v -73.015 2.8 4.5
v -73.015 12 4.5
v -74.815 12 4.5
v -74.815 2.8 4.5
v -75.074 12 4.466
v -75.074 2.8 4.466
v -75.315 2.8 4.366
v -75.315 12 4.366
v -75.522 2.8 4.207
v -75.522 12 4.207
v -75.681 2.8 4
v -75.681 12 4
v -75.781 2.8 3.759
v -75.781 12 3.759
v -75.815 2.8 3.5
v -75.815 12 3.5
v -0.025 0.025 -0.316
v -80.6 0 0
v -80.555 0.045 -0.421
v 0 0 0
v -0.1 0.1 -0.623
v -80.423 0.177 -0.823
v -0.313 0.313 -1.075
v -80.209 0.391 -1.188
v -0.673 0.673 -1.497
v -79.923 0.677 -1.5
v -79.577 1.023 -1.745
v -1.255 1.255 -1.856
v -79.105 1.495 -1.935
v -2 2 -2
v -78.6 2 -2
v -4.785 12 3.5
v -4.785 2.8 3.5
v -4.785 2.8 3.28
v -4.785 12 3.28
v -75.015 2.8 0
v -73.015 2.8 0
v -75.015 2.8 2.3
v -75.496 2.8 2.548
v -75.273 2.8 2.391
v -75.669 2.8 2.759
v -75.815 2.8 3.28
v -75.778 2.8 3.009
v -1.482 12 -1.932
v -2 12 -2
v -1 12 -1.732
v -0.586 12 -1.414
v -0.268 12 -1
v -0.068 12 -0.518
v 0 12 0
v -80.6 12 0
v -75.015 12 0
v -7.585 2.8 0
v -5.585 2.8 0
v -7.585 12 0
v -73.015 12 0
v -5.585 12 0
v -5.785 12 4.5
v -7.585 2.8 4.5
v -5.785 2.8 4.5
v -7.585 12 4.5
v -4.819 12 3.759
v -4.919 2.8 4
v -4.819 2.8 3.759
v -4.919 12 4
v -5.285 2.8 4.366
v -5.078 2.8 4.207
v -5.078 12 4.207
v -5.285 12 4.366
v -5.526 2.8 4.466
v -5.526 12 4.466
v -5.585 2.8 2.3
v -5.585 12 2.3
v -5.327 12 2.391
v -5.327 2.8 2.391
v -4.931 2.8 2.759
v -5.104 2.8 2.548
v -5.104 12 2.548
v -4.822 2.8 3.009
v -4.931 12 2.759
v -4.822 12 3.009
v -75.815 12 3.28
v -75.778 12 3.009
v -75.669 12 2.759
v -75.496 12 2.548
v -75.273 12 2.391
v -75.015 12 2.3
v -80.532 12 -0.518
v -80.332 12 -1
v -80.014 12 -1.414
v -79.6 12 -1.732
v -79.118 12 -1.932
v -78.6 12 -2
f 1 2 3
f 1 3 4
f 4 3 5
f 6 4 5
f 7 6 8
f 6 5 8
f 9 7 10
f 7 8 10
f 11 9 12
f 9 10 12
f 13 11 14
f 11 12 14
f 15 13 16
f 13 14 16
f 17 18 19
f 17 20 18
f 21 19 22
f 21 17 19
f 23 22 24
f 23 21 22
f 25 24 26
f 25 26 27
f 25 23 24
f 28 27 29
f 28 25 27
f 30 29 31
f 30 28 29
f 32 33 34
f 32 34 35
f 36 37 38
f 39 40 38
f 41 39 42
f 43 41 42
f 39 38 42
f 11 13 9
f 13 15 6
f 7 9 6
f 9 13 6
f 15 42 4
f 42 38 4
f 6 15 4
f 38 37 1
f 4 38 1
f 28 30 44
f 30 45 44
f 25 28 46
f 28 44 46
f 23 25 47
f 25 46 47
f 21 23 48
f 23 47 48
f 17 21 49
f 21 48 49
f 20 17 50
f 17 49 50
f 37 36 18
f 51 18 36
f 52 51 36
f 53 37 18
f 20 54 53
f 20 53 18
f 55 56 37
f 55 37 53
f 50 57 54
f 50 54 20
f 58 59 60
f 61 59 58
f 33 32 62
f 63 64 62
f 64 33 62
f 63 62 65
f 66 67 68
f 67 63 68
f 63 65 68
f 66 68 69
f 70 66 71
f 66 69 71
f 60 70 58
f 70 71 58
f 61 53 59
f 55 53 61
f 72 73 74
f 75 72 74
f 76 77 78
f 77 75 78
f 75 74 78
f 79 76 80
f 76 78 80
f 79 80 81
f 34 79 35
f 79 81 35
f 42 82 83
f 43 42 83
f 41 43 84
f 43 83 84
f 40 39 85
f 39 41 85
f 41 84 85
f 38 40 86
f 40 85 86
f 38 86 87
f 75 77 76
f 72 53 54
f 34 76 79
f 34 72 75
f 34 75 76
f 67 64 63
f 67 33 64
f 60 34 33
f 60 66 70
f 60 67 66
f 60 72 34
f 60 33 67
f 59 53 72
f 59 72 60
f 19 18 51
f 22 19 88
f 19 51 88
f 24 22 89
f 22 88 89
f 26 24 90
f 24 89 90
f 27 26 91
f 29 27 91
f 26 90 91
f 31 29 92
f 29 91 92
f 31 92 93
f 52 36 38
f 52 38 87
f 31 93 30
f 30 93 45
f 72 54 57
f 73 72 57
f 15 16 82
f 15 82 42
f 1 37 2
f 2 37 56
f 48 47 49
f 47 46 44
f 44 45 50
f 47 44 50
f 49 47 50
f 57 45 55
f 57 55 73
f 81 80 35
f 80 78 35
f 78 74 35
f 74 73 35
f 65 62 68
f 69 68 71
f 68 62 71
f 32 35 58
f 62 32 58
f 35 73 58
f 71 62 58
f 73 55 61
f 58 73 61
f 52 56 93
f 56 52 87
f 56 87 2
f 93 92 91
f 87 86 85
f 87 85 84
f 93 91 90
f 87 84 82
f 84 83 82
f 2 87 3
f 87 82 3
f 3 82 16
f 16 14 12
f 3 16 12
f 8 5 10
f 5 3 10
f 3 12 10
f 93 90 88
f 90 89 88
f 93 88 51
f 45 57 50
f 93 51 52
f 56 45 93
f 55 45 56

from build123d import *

# Parameters (mm, degrees)
F0_W        = 80.6
F0_H        = 12
F1_DEPTH    = 2
F2_W        = 2
F2_H        = 9.2
F3_DEPTH    = 4.5
F4_W        = 9.2
F4_H        = 2.2
F5_DEPTH    = 0.8
F6_R        = 1.99999
F7_W        = 9.2
F7_H        = 2.2
F8_DEPTH    = 0.8
F9_T1_DEPTH = 14.0989794856
F9_T3_DEPTH = 14.2


# Not quite as in the source:
# - a fillet or chamfer that OpenCascade refuses, or shapes differently, is made with other operations: its cross-section is extruded or revolved along the edge and cut away or added
# - a fillet or chamfer is up to 0.001 mm smaller than in the source, because OpenCascade refuses the exact size


with BuildPart() as f1:
    # F0 (on Top) → F1 (new body)
    with BuildSketch(Plane.XY):
        with Locations((-40.3, 6)):
            Rectangle(F0_W, F0_H)
    extrude(amount=-F1_DEPTH)

    # F2 (on face) → F3 (join)
    with BuildSketch(Plane.XY):
        with Locations((-74.015, 7.4)):
            Rectangle(F2_W, F2_H)
        with Locations((-6.585, 7.4)):
            Rectangle(F2_W, F2_H)
    extrude(amount=F3_DEPTH)

    # F4 (on face) → F5 (join)
    with BuildSketch(Plane(origin=(-75.015, 0, 0), x_dir=(0, -1, 0), z_dir=(-1, 0, 0))):
        with Locations((-7.4, 3.4)):
            Rectangle(F4_W, F4_H)
    extrude(amount=F5_DEPTH)

    # F6 (radius 2 in the source; OpenCascade refuses exactly that, so slightly less here)
    f6_edges = [f1.edges().sort_by_distance(p)[0] for p in [
        (-80.6, 6, -2),
        (0, 6, -2),
        (-40.3, 0, -2),
    ]]
    fillet(f6_edges, radius=F6_R)

    # F7 (on face) → F8 (join)
    with BuildSketch(Plane.YZ.offset(-5.585)):
        with Locations((7.4, 3.4)):
            Rectangle(F7_W, F7_H)
    extrude(amount=F8_DEPTH)

    # F9: fillet of radius 1 on 4 edges, made by hand

    # F9_s2 → F9_t1 (cut)
    with BuildSketch(Plane.XZ.offset(-14.4494897428)):
        with BuildLine():
            ThreePointArc((-5.585, 2.3), (-5.0104033308, 2.6473403651), (-4.785, 3.2797958971))
            Line((-4.785, 3.2797958971), (-4.785, 2.3))
            Line((-4.785, 2.3), (-5.585, 2.3))
        make_face()
        with BuildLine():
            ThreePointArc((-75.815, 3.2797958971), (-75.5895966692, 2.6473403651), (-75.015, 2.3))
            Line((-75.015, 2.3), (-75.815, 2.3))
            Line((-75.815, 2.3), (-75.815, 3.2797958971))
        make_face()
    extrude(amount=F9_T1_DEPTH, mode=Mode.SUBTRACT)

    # F9_s4 → F9_t3 (cut)
    with BuildSketch(Plane.XZ.offset(-14.5)):
        with BuildLine():
            ThreePointArc((-4.785, 3.5), (-5.0778932188, 4.2071067812), (-5.785, 4.5))
            Line((-5.785, 4.5), (-4.785, 4.5))
            Line((-4.785, 4.5), (-4.785, 3.5))
        make_face()
        with BuildLine():
            ThreePointArc((-74.815, 4.5), (-75.5221067812, 4.2071067812), (-75.815, 3.5))
            Line((-75.815, 3.5), (-75.815, 4.5))
            Line((-75.815, 4.5), (-74.815, 4.5))
        make_face()
    extrude(amount=F9_T3_DEPTH, mode=Mode.SUBTRACT)


solid = f1.part
